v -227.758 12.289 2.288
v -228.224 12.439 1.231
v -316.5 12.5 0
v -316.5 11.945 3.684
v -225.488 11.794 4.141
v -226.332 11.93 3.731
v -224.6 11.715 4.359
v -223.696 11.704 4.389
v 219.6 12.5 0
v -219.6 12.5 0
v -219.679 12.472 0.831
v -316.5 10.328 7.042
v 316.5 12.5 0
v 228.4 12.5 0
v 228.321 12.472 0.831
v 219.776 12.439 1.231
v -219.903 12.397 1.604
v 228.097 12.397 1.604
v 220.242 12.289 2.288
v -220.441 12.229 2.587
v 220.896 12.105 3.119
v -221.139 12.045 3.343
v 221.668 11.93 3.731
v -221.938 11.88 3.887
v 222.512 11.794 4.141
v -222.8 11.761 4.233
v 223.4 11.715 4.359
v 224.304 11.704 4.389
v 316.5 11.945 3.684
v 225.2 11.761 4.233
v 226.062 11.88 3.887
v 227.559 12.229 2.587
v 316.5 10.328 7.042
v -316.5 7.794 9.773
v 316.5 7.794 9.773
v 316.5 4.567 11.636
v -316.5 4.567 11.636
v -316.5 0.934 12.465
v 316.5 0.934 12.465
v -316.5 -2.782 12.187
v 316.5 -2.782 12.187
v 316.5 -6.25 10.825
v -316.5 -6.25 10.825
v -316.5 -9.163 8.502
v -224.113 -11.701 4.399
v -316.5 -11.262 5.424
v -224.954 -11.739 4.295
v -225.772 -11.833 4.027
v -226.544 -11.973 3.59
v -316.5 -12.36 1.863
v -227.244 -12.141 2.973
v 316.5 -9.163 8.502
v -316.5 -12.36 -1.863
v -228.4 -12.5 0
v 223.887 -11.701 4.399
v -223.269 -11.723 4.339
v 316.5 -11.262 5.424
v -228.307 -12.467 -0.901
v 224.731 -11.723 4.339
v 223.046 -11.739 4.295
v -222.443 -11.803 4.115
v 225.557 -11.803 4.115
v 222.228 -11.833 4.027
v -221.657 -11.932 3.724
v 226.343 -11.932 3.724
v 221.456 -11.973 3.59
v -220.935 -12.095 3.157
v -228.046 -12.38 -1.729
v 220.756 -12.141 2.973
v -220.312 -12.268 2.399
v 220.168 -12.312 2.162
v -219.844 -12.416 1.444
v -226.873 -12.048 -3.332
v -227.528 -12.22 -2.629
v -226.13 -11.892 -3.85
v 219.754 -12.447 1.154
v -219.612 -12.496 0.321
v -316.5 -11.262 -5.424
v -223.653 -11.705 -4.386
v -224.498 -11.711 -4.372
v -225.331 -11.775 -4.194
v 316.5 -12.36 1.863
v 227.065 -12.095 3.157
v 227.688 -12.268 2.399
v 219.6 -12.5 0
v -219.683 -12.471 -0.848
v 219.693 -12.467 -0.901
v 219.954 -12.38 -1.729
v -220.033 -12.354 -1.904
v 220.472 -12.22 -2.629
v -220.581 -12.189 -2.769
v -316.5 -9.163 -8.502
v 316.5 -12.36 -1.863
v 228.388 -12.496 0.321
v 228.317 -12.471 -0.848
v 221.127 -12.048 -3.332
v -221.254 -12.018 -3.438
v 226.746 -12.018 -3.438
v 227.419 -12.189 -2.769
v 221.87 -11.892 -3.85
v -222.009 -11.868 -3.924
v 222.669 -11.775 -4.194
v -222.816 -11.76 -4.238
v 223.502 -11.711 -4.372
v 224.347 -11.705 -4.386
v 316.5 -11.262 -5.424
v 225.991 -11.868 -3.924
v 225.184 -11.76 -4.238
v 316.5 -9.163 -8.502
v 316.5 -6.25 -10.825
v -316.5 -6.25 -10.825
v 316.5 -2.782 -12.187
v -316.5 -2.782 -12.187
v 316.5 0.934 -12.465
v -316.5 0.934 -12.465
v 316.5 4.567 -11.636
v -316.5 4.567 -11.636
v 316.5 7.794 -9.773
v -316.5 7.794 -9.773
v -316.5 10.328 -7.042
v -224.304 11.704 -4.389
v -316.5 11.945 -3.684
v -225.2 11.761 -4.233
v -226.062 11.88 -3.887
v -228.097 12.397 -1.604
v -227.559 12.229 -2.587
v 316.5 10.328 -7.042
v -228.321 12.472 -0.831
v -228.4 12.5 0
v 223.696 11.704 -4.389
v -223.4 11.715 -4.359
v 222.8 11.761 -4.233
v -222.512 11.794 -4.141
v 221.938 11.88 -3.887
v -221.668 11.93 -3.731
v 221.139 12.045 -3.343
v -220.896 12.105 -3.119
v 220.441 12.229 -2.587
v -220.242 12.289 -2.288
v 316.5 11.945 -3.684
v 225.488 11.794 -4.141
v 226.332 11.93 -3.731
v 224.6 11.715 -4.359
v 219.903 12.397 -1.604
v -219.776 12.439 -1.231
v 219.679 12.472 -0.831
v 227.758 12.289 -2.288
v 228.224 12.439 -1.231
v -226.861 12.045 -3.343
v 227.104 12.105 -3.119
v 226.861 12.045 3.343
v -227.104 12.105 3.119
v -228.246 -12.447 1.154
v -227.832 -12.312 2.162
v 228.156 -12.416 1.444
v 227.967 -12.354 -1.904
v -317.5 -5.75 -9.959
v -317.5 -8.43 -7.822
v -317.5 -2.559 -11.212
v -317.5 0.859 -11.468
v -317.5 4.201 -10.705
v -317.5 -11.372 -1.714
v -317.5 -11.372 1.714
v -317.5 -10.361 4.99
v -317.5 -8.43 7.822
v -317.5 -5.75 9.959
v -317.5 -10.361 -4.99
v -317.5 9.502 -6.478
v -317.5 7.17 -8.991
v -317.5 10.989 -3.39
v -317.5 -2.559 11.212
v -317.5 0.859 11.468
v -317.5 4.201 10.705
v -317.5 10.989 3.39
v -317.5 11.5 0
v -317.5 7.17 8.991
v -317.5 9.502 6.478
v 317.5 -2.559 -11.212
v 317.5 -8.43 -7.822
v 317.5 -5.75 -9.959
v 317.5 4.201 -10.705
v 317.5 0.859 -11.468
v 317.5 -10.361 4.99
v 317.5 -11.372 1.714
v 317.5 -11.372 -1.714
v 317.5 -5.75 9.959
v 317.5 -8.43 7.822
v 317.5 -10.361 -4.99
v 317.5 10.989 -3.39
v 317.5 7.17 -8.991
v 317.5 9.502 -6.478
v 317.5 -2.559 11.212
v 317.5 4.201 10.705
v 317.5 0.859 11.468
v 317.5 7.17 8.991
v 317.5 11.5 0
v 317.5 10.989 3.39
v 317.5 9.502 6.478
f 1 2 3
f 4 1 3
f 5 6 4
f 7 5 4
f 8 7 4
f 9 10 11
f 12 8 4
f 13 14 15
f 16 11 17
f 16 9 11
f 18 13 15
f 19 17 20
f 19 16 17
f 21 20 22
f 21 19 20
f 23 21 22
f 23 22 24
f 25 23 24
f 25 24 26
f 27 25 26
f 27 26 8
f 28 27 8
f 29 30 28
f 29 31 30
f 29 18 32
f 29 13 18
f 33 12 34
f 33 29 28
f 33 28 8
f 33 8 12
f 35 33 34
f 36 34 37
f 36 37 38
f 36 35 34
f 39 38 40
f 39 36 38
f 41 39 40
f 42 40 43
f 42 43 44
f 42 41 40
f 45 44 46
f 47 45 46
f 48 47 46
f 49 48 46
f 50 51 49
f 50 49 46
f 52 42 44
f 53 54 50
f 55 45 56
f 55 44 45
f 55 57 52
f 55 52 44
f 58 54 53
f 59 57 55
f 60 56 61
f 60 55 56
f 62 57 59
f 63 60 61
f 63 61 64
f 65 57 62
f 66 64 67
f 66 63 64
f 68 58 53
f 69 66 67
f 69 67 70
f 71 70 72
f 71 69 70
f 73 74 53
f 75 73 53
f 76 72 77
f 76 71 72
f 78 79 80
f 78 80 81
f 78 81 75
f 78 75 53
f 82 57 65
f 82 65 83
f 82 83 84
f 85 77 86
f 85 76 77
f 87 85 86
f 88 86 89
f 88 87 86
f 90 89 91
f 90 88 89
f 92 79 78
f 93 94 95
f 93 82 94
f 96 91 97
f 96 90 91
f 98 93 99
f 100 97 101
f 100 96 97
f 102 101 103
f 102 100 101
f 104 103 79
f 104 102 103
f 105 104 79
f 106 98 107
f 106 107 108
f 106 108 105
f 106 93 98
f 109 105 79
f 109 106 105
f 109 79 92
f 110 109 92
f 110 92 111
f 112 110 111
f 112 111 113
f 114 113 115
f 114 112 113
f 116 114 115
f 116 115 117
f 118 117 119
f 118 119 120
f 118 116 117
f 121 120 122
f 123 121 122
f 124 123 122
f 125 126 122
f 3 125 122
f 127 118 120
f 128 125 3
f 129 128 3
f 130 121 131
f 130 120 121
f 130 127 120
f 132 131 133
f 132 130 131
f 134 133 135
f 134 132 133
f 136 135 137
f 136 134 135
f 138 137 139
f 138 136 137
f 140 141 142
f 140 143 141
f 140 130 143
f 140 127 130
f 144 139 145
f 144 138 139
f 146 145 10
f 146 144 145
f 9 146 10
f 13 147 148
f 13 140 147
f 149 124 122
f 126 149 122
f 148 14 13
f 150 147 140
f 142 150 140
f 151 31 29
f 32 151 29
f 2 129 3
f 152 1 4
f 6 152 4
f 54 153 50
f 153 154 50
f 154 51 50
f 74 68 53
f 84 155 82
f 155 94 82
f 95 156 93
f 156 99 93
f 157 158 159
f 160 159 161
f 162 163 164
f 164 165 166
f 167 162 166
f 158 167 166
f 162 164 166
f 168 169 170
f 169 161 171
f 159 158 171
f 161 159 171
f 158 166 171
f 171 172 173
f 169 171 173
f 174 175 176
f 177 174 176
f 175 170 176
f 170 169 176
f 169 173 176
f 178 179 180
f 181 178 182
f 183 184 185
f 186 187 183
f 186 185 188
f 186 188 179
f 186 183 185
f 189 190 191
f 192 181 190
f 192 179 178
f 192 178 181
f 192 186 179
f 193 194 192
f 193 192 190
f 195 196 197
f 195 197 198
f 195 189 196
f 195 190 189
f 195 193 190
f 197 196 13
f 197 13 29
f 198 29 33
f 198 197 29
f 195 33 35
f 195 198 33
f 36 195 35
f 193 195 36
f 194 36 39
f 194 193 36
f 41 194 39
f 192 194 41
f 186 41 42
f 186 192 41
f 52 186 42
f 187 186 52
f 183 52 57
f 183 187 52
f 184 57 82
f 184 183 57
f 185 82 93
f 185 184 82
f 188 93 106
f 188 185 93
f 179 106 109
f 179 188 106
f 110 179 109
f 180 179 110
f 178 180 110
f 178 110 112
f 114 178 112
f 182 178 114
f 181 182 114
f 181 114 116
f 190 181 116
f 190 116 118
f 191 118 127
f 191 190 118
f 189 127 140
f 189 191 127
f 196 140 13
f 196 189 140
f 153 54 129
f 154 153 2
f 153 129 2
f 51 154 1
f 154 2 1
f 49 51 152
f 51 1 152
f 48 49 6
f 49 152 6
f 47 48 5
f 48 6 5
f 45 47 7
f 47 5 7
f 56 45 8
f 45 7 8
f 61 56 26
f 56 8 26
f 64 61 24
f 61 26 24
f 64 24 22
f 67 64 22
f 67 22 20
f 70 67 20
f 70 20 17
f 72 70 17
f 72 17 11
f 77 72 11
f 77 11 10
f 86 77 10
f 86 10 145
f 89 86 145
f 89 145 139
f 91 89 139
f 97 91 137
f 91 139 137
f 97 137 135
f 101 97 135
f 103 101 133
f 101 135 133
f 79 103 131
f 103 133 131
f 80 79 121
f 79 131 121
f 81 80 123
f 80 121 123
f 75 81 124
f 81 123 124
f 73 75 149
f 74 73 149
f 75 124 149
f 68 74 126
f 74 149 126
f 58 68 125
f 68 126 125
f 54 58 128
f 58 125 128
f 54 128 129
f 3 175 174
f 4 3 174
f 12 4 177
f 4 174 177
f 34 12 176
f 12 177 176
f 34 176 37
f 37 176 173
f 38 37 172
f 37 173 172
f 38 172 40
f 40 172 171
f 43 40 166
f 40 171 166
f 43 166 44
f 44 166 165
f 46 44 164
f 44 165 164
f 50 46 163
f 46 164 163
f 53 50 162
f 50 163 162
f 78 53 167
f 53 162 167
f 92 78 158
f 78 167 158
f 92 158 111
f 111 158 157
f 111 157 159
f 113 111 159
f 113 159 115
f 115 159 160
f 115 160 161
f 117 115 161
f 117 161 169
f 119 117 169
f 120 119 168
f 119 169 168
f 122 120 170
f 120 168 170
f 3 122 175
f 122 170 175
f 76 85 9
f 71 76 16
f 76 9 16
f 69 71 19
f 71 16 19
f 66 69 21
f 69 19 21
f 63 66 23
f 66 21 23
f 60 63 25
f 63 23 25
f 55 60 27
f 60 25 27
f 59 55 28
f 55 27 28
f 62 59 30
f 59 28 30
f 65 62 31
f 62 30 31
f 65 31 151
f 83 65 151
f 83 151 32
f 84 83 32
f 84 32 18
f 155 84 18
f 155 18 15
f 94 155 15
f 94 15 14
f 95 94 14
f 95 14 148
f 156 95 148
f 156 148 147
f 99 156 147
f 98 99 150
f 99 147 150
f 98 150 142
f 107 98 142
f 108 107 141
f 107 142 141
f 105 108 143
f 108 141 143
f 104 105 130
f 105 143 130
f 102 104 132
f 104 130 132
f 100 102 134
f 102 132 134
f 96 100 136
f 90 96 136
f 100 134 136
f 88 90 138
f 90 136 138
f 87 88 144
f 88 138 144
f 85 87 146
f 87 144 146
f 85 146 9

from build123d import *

# Parameters (mm, degrees)
F0_R     = 12.5
F1_DEPTH = 317.5
F4_D     = 8.8
F5_SIZE  = 1


with BuildPart() as f1:
    # F0 (on Right) → F1 (new body, symmetric)
    with BuildSketch(Plane.YZ):
        Circle(F0_R)
    extrude(amount=F1_DEPTH, both=True)

    # F4 (through all)
    with Locations(Plane.XZ.offset(25)):
        with Locations((-224, 0), (224, 0)):
            Hole(F4_D / 2)

    # F5
    f5_edges = [f1.edges().sort_by_distance(p)[0] for p in [
        (317.5, -12.5, 0),
        (-317.5, -12.5, 0),
    ]]
    chamfer(f5_edges, length=F5_SIZE)


solid = f1.part
